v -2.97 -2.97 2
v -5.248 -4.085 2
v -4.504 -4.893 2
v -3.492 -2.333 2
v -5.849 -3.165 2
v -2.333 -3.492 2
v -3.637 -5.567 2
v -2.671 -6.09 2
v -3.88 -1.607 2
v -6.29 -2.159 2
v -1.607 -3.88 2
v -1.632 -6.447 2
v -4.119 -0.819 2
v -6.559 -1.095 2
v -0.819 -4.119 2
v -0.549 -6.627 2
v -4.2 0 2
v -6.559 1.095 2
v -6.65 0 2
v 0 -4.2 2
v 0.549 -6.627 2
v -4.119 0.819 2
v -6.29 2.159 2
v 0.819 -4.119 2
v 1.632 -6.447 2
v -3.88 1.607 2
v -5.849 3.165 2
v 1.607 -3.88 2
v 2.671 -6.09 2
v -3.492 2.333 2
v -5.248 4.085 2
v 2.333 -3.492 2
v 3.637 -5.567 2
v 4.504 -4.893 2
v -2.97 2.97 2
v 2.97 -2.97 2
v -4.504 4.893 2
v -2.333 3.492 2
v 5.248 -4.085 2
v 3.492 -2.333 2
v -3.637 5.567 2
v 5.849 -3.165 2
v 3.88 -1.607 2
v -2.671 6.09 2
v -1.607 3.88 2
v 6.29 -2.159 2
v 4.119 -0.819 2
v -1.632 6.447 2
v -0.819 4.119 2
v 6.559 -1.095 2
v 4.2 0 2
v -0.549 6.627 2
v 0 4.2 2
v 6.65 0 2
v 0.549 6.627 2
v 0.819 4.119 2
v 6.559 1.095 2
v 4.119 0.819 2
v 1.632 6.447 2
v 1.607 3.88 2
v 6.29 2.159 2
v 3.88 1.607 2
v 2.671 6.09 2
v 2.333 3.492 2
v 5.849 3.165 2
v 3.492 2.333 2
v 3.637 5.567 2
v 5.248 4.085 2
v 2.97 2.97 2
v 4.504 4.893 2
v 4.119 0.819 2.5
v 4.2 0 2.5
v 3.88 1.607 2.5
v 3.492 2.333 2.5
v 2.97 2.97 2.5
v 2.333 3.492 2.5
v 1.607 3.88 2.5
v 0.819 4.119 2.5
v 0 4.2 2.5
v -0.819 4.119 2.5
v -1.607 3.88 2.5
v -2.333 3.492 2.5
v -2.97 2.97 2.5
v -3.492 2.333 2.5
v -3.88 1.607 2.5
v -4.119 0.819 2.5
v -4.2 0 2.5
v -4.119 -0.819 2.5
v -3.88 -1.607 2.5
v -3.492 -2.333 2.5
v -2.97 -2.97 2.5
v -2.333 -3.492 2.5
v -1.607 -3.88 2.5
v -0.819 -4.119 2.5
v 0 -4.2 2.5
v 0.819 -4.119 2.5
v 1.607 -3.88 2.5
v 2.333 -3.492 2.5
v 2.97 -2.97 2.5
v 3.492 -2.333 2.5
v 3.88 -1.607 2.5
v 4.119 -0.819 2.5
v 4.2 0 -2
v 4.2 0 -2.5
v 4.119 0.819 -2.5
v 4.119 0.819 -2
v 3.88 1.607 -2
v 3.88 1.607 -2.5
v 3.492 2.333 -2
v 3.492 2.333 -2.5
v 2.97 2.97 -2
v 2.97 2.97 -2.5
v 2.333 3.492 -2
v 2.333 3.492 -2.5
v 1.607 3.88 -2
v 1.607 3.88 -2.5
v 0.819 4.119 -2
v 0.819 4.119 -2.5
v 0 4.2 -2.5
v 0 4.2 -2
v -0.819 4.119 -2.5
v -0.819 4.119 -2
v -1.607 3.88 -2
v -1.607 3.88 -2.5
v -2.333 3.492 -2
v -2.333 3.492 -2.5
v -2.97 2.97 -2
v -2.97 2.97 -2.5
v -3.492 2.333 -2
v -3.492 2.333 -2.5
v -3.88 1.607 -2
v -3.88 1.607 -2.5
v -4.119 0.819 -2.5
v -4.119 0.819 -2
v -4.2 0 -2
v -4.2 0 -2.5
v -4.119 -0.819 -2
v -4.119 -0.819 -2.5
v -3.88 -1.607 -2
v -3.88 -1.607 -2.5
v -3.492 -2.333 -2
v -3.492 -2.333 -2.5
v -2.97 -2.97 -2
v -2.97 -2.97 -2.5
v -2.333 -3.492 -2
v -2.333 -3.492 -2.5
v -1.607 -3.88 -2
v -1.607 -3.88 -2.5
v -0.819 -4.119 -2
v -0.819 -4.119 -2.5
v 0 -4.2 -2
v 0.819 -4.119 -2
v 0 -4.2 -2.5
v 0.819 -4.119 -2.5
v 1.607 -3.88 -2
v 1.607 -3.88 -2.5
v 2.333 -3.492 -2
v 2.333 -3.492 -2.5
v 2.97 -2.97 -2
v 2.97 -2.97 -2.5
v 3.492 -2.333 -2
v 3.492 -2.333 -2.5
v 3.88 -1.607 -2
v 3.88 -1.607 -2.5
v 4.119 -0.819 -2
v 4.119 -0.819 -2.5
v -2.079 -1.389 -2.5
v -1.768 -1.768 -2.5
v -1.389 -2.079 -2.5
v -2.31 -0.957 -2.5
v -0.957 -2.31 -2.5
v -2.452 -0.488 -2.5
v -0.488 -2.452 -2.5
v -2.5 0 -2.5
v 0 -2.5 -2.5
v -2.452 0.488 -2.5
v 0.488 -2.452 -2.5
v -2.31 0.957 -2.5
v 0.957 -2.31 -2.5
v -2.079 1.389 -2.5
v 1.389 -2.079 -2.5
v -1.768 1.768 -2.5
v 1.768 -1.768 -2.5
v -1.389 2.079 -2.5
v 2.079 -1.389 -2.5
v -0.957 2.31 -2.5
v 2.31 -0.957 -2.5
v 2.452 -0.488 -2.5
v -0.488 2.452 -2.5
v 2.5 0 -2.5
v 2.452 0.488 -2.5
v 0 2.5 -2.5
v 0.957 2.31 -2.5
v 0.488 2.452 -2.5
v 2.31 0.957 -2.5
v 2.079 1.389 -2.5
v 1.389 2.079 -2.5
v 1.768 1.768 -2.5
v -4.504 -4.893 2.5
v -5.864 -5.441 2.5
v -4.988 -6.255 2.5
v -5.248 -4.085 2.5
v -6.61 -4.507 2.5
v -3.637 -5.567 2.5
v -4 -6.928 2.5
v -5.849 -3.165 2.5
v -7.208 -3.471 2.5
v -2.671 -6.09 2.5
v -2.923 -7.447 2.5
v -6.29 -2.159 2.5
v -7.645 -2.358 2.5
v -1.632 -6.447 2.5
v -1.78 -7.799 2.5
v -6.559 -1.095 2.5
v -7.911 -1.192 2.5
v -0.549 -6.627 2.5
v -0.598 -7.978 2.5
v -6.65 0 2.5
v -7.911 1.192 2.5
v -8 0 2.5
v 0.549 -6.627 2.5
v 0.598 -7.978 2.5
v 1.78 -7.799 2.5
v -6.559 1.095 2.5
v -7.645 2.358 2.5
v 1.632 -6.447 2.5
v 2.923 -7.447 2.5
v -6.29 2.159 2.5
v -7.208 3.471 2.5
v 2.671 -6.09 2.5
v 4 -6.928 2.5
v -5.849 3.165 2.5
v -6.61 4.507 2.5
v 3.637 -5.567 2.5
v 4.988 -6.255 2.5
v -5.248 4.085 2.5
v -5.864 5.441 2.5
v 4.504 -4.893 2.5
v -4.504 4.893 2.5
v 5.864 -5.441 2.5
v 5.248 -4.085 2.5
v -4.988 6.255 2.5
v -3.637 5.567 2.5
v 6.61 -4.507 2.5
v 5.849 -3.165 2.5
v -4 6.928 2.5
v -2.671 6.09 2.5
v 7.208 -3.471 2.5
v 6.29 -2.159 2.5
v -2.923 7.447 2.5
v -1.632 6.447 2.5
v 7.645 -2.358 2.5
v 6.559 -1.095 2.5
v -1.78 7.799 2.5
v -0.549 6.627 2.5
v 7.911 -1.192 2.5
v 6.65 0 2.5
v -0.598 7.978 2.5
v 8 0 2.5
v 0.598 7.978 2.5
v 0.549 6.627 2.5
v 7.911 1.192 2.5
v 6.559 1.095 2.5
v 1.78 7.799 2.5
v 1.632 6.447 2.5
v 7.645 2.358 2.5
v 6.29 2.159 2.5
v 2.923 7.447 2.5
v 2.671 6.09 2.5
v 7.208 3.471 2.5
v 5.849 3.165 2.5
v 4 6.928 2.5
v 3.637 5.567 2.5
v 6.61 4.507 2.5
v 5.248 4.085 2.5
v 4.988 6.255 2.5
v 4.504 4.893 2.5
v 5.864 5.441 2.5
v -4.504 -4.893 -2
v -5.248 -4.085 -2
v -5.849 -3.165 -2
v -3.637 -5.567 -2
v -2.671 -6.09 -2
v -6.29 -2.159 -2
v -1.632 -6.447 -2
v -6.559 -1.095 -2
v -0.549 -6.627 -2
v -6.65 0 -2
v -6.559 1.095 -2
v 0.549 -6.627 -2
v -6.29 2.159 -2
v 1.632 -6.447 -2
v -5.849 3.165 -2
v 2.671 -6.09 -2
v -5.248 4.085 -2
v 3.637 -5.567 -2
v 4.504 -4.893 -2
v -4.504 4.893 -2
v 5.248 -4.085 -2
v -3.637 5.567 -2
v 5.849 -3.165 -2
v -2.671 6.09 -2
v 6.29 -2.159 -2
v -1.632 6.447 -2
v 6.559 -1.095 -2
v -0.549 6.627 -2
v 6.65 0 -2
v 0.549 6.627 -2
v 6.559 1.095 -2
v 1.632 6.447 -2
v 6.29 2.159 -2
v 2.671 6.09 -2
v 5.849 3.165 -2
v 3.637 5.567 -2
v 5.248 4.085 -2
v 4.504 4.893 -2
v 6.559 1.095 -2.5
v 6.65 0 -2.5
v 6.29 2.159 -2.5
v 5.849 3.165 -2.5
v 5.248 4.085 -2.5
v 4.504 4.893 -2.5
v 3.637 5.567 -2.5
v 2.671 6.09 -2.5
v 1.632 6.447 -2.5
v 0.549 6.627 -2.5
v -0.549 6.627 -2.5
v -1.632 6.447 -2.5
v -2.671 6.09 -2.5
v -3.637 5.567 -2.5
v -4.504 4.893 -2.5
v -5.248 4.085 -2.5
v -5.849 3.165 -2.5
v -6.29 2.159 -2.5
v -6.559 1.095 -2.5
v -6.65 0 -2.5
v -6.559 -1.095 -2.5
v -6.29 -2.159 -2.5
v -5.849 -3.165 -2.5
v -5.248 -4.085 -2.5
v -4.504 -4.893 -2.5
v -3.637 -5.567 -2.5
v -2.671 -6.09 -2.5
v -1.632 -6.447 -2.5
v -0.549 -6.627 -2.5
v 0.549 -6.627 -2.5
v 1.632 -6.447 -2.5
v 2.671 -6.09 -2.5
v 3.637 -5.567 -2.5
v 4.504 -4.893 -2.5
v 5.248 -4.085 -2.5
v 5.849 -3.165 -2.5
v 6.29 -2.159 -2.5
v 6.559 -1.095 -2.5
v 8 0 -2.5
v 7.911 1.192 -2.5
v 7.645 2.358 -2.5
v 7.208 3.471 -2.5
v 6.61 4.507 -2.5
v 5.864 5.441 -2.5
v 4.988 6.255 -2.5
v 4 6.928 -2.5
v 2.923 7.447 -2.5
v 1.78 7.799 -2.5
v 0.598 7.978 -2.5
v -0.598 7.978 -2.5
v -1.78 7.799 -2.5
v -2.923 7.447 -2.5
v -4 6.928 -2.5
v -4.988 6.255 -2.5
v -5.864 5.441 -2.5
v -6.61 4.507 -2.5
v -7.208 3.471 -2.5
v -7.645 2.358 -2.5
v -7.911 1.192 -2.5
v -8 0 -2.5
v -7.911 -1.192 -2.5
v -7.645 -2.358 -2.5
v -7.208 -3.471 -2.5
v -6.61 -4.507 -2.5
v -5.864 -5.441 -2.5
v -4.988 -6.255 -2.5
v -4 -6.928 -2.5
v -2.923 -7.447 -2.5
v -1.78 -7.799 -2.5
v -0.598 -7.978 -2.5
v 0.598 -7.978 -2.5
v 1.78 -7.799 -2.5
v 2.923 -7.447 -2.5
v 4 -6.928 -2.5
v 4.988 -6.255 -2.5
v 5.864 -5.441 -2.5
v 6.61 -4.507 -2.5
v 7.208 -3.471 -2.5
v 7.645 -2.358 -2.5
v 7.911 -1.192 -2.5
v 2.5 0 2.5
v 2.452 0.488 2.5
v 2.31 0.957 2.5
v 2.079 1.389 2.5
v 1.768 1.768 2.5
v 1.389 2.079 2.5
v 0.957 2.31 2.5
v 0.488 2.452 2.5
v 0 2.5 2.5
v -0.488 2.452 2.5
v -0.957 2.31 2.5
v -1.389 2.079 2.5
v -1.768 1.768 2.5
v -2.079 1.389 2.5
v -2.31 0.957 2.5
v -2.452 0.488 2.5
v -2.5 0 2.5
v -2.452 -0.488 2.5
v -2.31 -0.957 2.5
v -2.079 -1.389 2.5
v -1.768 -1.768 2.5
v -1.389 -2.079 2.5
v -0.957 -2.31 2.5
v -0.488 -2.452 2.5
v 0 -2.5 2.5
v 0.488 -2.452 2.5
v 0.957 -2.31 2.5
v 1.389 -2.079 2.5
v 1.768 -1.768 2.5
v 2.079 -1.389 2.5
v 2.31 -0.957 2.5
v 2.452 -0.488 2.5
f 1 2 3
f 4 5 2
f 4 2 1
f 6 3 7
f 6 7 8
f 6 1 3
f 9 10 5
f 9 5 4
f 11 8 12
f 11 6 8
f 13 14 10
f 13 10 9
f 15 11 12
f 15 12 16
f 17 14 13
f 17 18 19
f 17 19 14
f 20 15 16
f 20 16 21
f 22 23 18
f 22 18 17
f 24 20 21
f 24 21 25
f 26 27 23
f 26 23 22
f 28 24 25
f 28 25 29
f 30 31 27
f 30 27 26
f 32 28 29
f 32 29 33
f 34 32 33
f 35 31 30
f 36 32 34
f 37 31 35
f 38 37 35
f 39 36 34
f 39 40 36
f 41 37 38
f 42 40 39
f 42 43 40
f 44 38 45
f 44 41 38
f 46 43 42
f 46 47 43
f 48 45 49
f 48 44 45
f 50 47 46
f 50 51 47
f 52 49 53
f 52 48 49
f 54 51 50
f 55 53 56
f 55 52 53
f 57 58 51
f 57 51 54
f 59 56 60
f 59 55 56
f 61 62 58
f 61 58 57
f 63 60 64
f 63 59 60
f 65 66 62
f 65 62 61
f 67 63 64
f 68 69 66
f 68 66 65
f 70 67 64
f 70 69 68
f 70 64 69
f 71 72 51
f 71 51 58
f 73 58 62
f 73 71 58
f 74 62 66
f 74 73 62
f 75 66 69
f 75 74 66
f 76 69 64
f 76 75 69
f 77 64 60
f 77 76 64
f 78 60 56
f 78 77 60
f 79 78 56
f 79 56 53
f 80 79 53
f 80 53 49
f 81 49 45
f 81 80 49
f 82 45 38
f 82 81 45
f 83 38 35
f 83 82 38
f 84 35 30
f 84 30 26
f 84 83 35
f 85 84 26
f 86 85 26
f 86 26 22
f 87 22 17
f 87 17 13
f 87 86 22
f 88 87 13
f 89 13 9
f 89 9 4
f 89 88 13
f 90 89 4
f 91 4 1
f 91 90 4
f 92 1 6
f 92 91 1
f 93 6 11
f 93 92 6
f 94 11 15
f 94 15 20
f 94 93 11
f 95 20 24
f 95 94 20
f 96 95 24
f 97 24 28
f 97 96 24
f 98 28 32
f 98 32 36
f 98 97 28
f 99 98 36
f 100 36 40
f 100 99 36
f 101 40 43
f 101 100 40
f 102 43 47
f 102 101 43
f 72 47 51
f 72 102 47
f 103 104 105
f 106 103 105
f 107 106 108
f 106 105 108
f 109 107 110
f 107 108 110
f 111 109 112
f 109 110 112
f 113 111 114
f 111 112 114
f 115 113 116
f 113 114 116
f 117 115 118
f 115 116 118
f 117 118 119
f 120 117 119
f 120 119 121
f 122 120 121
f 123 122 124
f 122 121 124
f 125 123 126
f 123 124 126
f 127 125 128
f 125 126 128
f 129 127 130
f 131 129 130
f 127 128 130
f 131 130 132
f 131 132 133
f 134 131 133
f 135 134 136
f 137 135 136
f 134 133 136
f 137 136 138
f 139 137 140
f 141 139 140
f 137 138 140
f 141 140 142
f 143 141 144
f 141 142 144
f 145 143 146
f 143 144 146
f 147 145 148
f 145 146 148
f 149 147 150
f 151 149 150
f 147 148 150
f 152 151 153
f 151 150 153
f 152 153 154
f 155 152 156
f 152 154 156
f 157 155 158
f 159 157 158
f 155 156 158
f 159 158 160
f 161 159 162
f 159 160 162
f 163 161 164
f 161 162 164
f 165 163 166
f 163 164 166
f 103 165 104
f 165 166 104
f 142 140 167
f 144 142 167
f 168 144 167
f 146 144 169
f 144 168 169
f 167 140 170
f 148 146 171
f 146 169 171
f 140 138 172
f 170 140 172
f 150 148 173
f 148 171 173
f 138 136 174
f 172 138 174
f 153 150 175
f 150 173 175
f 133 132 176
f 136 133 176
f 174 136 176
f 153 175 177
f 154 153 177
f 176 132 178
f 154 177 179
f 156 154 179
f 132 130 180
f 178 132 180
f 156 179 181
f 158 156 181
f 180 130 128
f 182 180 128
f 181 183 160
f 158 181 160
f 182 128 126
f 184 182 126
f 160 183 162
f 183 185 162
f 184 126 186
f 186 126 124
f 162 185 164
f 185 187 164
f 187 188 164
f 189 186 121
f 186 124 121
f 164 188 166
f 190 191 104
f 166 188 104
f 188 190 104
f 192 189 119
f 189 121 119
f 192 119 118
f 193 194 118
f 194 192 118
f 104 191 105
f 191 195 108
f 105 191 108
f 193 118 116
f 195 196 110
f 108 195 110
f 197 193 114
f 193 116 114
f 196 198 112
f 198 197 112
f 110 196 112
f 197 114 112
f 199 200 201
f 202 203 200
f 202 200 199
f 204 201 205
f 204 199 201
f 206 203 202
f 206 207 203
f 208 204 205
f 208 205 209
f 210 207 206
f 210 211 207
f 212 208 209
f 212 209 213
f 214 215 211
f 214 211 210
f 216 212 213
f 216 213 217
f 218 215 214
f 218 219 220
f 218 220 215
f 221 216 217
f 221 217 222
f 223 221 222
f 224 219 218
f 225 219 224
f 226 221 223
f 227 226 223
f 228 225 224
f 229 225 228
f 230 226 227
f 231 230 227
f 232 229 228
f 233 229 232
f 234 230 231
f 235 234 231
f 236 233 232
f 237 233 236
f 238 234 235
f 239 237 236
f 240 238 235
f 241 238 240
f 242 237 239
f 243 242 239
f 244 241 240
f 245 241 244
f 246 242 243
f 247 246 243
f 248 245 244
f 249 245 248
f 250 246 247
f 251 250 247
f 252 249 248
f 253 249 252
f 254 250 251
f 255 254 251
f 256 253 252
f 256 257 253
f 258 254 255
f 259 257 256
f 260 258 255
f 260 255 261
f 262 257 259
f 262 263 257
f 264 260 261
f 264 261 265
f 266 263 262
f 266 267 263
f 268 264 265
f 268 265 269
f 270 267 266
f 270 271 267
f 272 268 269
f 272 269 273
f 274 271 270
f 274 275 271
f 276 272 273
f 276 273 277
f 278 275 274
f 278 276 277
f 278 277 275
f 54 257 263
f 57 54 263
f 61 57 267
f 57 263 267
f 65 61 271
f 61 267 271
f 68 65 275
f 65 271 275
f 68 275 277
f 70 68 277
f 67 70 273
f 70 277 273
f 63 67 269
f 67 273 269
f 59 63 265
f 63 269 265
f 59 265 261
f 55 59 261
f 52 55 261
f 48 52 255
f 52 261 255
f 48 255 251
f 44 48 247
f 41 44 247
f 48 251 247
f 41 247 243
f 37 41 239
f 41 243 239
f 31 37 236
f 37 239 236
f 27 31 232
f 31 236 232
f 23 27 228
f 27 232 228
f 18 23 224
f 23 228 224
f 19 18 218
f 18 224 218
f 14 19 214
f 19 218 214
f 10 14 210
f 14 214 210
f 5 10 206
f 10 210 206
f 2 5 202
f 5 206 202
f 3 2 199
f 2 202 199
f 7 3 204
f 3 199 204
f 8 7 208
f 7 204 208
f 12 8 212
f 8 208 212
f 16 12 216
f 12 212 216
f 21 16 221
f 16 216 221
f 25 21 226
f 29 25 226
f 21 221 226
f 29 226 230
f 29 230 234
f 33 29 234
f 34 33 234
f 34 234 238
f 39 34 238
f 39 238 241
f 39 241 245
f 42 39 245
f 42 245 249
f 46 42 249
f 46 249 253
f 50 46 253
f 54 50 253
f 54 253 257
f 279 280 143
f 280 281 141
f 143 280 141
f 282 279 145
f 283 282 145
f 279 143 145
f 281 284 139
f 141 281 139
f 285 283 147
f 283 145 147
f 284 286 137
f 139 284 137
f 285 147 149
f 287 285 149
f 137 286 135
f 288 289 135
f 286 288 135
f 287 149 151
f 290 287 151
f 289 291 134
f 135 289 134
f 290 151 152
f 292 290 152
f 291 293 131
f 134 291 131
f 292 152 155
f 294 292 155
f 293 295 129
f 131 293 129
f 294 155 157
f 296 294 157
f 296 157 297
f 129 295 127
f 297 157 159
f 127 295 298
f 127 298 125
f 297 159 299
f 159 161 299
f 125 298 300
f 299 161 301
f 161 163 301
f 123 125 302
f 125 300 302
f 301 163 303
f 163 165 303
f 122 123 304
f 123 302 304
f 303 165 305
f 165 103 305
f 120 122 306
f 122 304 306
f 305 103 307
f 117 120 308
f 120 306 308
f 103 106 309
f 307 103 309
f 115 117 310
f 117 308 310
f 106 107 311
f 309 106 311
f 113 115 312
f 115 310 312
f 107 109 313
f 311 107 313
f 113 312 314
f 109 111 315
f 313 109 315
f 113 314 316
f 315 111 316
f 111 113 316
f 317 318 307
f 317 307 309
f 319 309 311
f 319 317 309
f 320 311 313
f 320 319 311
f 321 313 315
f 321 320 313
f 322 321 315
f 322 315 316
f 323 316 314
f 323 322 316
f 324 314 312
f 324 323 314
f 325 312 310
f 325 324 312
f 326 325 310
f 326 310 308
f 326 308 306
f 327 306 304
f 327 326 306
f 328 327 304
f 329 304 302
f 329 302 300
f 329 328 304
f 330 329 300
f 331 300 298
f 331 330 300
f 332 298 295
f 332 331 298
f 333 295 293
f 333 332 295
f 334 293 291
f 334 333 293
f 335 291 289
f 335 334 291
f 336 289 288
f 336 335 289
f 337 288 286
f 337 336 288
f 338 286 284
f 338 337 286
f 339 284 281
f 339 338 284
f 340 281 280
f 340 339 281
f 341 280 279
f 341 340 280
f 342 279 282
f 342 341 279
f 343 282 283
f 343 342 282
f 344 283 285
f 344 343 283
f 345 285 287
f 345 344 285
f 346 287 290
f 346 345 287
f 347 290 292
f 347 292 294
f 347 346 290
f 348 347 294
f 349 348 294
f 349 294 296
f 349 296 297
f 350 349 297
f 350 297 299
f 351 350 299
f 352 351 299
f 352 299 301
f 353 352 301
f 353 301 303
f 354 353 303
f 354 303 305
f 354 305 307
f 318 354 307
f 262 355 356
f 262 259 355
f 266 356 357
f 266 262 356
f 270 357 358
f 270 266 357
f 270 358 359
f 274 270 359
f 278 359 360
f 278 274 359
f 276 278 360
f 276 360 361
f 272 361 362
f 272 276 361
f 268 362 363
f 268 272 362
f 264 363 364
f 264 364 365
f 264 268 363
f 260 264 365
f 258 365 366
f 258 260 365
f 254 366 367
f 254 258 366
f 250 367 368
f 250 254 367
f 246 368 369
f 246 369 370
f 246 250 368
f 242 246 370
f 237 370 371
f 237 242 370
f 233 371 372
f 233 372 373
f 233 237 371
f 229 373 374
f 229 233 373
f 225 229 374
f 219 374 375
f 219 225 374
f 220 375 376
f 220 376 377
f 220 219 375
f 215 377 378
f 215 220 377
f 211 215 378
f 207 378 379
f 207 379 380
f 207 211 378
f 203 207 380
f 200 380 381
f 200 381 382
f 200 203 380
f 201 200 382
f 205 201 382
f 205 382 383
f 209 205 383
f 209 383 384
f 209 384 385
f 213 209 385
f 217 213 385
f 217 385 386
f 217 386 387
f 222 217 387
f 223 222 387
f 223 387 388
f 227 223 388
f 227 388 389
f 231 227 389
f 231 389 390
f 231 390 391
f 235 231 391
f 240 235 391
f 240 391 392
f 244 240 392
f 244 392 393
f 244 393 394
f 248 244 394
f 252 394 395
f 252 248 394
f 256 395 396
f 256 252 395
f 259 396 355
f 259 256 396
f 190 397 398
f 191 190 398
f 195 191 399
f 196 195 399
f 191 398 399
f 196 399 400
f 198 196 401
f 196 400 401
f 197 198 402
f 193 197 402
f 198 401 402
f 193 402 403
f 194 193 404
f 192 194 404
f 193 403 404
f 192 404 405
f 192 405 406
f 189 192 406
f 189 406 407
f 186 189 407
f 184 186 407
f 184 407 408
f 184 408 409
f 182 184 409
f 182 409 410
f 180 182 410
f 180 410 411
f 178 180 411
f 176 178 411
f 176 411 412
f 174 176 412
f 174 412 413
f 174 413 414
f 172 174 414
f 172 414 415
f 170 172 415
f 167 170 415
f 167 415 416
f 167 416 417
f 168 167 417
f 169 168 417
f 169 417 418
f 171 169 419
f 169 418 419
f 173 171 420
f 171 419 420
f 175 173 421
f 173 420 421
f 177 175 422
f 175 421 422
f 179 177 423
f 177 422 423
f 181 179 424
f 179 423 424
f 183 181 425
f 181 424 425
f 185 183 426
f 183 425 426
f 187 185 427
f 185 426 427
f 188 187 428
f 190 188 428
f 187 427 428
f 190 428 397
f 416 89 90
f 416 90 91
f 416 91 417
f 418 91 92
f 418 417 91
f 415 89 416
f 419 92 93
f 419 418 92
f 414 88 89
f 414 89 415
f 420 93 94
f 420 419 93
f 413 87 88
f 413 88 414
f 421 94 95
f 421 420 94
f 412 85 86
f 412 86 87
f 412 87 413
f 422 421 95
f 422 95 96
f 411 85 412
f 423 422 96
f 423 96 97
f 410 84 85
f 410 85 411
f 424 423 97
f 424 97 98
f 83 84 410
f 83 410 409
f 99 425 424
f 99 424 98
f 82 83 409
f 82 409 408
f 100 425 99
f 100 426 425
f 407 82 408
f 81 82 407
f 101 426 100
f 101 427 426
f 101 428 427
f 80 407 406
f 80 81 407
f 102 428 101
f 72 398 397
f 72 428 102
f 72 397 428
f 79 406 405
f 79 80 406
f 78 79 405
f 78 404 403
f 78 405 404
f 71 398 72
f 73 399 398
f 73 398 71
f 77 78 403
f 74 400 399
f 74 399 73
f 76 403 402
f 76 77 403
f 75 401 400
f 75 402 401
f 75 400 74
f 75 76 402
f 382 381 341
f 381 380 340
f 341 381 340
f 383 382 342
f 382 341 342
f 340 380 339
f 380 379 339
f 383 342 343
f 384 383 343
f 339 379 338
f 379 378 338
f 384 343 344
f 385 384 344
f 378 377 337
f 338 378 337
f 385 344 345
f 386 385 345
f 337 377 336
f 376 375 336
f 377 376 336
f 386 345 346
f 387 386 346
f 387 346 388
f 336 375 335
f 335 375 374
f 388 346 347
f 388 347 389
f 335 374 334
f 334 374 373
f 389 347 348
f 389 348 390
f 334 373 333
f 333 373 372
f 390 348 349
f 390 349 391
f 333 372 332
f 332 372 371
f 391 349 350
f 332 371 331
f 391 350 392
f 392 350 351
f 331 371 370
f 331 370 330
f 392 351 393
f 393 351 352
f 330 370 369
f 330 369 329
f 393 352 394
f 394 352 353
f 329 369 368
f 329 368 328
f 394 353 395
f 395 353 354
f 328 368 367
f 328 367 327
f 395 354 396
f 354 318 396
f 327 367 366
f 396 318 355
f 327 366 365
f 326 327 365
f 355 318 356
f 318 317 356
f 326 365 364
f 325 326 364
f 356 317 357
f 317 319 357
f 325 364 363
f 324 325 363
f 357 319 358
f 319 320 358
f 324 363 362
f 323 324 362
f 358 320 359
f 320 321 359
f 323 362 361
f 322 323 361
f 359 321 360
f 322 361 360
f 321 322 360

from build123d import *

# Parameters (mm, degrees)
SKETCH_1_R          = 8
EXTRUDE_1_DEPTH     = 2.5
SKETCH_2_R          = 2.5
CUT_EXTRUDE_1_DEPTH = 6
SKETCH_3_R          = 6.65
SKETCH_3_R_2        = 4.2
CUT_EXTRUDE_2_DEPTH = 0.5


with BuildPart() as part:
    # 草圖1 → 填料-伸長1 (new body, symmetric)
    with BuildSketch(Plane.XY):
        Circle(SKETCH_1_R)
    extrude(amount=EXTRUDE_1_DEPTH, both=True)

    # 草圖2 → 除料-伸長1 (cut, through all)
    with BuildSketch(Plane.XY.offset(2.5)):
        Circle(SKETCH_2_R)
    extrude(amount=-CUT_EXTRUDE_1_DEPTH, mode=Mode.SUBTRACT)

    # 草圖3 → 除料-伸長2 (cut)
    with BuildSketch(Plane.XY.offset(2.5)):
        Circle(SKETCH_3_R)
        Circle(SKETCH_3_R_2, mode=Mode.SUBTRACT)
    cut_extrude_2 = extrude(amount=-CUT_EXTRUDE_2_DEPTH, mode=Mode.SUBTRACT)

    # 鏡射1: 除料-伸長2 across plane
    add(cut_extrude_2.mirror(Plane.XY), mode=Mode.SUBTRACT)


solid = part.part
